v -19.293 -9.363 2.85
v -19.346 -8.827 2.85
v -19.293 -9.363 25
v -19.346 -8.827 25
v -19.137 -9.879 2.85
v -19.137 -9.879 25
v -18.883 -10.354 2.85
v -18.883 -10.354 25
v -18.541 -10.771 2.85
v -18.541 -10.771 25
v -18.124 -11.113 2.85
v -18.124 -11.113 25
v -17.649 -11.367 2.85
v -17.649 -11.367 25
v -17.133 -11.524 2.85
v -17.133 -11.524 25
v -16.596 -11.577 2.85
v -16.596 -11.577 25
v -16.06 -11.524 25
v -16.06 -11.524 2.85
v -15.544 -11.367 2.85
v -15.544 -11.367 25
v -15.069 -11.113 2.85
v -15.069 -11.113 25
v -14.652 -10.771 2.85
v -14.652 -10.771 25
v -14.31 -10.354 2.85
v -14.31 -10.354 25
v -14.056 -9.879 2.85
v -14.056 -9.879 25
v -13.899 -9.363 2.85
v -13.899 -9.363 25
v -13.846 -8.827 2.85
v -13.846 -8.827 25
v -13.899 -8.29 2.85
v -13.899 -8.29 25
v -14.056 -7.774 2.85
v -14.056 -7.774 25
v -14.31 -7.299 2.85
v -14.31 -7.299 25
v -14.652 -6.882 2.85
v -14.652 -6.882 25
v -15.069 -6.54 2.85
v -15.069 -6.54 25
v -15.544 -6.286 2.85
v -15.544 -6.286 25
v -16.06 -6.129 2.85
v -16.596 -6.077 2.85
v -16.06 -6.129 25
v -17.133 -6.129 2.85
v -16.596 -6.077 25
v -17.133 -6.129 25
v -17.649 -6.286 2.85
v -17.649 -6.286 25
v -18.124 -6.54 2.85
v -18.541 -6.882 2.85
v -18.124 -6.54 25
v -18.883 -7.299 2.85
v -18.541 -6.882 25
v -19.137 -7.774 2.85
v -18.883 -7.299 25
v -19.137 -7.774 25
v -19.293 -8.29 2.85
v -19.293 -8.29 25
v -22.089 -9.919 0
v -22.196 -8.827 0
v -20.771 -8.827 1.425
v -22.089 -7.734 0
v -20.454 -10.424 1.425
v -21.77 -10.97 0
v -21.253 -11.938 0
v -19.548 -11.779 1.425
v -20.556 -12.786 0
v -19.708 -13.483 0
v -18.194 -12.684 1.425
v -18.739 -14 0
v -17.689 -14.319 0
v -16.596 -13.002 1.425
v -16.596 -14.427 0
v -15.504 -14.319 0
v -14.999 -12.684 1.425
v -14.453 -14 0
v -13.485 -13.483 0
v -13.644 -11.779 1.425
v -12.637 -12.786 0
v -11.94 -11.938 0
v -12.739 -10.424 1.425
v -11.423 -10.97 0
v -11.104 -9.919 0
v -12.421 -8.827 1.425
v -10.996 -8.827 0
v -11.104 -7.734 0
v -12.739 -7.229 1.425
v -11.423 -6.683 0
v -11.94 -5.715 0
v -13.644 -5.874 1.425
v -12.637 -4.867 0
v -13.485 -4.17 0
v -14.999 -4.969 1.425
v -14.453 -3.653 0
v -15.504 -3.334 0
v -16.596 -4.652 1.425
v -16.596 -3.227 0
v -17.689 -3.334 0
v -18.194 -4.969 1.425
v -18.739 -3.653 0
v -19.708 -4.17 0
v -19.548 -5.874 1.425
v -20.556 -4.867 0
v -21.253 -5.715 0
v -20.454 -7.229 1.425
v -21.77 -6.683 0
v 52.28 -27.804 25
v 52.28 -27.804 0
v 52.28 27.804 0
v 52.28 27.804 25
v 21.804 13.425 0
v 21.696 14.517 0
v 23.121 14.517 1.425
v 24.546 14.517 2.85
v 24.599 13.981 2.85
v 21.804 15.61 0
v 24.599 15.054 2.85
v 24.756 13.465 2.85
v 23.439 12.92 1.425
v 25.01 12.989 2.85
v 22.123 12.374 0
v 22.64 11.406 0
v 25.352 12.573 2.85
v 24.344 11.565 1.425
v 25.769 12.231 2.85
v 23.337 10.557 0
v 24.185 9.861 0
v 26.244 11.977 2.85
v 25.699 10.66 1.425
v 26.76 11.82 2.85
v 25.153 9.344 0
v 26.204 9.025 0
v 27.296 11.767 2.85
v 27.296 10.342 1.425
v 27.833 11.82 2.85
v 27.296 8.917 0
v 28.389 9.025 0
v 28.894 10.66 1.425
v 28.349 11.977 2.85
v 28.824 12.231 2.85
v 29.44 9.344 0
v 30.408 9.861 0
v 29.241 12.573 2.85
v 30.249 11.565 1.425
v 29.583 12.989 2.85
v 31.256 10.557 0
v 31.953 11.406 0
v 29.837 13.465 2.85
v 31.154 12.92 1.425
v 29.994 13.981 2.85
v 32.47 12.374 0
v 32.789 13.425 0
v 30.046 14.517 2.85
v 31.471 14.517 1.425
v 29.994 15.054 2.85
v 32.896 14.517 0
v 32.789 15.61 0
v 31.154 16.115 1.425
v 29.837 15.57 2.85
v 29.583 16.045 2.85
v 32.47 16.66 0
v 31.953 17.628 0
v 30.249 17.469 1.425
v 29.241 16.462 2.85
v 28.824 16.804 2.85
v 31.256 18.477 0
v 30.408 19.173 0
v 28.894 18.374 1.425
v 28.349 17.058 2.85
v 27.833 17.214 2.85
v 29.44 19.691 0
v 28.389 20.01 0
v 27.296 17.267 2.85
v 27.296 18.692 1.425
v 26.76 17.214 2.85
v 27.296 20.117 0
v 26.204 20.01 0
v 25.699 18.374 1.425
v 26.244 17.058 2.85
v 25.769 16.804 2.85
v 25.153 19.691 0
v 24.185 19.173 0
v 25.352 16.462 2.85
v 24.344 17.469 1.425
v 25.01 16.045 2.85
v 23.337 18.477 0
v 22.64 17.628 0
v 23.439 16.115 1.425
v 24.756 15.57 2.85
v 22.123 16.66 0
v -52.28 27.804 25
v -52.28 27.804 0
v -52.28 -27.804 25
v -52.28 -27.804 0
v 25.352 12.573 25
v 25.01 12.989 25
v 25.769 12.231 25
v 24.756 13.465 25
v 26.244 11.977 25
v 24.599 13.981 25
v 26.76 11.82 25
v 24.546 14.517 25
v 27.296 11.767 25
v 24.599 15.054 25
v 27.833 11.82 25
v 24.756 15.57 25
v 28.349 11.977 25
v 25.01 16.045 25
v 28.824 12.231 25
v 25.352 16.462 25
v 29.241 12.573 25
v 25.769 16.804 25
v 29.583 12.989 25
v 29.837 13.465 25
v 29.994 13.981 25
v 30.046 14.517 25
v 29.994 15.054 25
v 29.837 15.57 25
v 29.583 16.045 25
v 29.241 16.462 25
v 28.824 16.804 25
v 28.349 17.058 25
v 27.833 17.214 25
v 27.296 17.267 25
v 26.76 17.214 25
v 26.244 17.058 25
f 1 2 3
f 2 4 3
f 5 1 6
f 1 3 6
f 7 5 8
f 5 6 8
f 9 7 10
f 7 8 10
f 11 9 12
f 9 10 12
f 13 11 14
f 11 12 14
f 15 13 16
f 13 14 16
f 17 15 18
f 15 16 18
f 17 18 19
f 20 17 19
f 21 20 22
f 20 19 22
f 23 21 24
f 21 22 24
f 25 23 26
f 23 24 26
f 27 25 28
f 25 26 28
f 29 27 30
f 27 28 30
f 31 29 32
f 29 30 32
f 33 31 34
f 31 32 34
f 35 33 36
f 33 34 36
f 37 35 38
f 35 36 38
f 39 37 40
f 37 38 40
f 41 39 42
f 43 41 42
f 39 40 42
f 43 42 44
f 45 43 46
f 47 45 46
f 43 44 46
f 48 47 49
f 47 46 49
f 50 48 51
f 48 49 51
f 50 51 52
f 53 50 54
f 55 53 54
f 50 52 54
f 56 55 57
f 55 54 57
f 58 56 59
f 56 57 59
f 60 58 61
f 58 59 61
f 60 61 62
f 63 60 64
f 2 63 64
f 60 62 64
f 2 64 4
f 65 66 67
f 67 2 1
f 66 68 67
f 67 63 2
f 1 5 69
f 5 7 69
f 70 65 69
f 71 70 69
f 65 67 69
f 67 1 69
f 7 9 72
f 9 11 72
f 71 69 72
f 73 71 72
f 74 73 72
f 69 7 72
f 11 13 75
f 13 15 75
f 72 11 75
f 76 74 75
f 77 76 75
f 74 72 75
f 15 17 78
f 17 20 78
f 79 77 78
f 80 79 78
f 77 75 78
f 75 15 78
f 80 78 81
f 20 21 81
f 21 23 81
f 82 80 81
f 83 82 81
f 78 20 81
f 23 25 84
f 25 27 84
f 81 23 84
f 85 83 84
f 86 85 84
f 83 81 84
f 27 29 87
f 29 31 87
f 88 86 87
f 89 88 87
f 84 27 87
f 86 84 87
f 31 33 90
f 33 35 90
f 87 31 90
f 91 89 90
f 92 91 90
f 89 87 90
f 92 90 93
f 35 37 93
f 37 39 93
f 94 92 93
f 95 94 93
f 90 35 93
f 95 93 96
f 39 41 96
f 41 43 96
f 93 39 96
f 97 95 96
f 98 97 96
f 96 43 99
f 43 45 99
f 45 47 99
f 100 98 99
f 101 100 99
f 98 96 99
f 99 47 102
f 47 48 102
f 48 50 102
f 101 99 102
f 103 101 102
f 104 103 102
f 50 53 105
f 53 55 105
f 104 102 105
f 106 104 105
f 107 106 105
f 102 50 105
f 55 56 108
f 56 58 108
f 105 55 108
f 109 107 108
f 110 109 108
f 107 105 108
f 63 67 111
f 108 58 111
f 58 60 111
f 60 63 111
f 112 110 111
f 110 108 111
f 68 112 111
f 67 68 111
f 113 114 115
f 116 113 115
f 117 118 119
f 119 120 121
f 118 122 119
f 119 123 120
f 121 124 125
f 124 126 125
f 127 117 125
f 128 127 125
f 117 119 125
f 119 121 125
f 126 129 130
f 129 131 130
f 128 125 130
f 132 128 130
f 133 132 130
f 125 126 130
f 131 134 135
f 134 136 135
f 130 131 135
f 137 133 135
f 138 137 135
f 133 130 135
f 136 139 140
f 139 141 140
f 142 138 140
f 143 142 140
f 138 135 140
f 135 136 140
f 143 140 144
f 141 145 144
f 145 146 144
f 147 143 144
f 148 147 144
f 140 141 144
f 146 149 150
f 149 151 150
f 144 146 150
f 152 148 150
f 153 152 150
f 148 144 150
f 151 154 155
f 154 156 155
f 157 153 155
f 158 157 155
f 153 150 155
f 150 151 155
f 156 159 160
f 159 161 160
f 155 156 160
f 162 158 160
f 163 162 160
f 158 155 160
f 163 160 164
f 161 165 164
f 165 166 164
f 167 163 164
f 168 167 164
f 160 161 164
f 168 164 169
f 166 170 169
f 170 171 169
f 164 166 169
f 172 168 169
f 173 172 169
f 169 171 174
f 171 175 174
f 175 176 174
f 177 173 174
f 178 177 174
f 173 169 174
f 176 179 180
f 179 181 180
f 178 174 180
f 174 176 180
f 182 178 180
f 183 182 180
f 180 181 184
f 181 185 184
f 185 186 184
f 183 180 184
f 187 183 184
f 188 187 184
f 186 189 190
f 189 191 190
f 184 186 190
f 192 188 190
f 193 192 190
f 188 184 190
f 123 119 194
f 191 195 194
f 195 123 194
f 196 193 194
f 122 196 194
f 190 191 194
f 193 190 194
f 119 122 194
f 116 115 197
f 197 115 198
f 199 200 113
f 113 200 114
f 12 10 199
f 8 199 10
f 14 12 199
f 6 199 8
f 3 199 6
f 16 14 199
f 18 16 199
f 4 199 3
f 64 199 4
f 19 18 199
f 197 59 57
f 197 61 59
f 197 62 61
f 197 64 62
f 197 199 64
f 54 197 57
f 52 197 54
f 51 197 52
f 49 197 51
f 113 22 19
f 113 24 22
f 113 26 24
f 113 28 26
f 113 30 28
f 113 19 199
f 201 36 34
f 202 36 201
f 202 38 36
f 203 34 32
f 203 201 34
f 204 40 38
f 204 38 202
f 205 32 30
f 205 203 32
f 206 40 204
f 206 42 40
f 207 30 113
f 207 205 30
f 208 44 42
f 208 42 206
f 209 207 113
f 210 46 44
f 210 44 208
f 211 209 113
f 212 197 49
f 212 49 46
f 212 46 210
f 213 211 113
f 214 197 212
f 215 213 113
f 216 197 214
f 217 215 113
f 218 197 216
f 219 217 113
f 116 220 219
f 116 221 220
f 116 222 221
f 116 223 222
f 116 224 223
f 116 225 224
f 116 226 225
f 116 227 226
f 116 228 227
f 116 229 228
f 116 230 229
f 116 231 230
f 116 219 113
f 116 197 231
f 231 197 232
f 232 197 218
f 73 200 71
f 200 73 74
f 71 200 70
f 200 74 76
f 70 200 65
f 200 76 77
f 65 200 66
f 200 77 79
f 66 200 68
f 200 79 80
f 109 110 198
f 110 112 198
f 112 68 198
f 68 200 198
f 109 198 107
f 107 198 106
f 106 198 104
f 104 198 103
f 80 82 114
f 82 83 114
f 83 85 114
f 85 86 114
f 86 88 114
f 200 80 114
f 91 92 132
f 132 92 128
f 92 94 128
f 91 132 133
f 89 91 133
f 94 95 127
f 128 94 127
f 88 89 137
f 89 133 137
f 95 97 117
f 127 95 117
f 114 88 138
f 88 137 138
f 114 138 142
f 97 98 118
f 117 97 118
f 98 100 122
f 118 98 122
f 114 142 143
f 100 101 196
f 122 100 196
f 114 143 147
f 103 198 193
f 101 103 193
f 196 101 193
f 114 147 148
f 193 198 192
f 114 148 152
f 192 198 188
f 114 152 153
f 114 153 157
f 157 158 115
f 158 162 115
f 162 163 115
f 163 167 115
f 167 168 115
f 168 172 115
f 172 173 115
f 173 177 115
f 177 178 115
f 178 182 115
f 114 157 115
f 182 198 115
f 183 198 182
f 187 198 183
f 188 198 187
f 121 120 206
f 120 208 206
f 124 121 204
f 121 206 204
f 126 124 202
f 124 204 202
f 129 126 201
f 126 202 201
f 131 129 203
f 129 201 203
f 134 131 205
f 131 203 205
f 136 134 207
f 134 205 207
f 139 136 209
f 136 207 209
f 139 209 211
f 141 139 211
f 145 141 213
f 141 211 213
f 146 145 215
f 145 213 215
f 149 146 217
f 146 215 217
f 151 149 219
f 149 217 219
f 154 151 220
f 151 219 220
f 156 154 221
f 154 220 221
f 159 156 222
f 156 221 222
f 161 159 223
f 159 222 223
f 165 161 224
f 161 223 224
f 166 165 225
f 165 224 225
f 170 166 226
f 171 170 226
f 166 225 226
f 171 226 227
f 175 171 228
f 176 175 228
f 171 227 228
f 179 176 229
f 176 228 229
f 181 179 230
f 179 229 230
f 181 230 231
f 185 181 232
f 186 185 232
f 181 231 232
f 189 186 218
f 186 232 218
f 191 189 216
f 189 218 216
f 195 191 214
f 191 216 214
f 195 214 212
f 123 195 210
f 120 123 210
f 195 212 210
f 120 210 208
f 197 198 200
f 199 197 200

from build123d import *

# Parameters (mm, degrees)
F1_DEPTH       = 25
F2_D           = 5.5
F2_CSINK_D     = 11.2
F2_CSINK_ANGLE = 90


with BuildPart() as f1:
    # F0 (on Top) → F1 (new body)
    with BuildSketch(Plane.XY):
        Polygon((1.8908311613, -27.8043653816), (52.2800497711, -27.8043653816), (52.2800497711, 27.8043653816), (-16.5963244791, -8.826507852), align=None)
        Polygon((-52.2800497711, -27.8043653816), (1.8908311613, -27.8043653816), (-16.5963244791, -8.826507852), align=None)
        Polygon((-52.2800497711, 27.8043653816), (-52.2800497711, -27.8043653816), (-16.5963244791, -8.826507852), align=None)
        Polygon((-16.5963244791, -8.826507852), (52.2800497711, 27.8043653816), (-52.2800497711, 27.8043653816), align=None)
    extrude(amount=F1_DEPTH)

    # F2 (through all)
    with Locations(Plane(origin=(0, 0, 0), x_dir=(1, 0, 0), z_dir=(0, 0, -1))):
        with Locations((27.2964816114, -14.5172269666), (-16.5963244791, 8.826507852)):
            CounterSinkHole(F2_D / 2, F2_CSINK_D / 2, counter_sink_angle=F2_CSINK_ANGLE)


solid = f1.part
